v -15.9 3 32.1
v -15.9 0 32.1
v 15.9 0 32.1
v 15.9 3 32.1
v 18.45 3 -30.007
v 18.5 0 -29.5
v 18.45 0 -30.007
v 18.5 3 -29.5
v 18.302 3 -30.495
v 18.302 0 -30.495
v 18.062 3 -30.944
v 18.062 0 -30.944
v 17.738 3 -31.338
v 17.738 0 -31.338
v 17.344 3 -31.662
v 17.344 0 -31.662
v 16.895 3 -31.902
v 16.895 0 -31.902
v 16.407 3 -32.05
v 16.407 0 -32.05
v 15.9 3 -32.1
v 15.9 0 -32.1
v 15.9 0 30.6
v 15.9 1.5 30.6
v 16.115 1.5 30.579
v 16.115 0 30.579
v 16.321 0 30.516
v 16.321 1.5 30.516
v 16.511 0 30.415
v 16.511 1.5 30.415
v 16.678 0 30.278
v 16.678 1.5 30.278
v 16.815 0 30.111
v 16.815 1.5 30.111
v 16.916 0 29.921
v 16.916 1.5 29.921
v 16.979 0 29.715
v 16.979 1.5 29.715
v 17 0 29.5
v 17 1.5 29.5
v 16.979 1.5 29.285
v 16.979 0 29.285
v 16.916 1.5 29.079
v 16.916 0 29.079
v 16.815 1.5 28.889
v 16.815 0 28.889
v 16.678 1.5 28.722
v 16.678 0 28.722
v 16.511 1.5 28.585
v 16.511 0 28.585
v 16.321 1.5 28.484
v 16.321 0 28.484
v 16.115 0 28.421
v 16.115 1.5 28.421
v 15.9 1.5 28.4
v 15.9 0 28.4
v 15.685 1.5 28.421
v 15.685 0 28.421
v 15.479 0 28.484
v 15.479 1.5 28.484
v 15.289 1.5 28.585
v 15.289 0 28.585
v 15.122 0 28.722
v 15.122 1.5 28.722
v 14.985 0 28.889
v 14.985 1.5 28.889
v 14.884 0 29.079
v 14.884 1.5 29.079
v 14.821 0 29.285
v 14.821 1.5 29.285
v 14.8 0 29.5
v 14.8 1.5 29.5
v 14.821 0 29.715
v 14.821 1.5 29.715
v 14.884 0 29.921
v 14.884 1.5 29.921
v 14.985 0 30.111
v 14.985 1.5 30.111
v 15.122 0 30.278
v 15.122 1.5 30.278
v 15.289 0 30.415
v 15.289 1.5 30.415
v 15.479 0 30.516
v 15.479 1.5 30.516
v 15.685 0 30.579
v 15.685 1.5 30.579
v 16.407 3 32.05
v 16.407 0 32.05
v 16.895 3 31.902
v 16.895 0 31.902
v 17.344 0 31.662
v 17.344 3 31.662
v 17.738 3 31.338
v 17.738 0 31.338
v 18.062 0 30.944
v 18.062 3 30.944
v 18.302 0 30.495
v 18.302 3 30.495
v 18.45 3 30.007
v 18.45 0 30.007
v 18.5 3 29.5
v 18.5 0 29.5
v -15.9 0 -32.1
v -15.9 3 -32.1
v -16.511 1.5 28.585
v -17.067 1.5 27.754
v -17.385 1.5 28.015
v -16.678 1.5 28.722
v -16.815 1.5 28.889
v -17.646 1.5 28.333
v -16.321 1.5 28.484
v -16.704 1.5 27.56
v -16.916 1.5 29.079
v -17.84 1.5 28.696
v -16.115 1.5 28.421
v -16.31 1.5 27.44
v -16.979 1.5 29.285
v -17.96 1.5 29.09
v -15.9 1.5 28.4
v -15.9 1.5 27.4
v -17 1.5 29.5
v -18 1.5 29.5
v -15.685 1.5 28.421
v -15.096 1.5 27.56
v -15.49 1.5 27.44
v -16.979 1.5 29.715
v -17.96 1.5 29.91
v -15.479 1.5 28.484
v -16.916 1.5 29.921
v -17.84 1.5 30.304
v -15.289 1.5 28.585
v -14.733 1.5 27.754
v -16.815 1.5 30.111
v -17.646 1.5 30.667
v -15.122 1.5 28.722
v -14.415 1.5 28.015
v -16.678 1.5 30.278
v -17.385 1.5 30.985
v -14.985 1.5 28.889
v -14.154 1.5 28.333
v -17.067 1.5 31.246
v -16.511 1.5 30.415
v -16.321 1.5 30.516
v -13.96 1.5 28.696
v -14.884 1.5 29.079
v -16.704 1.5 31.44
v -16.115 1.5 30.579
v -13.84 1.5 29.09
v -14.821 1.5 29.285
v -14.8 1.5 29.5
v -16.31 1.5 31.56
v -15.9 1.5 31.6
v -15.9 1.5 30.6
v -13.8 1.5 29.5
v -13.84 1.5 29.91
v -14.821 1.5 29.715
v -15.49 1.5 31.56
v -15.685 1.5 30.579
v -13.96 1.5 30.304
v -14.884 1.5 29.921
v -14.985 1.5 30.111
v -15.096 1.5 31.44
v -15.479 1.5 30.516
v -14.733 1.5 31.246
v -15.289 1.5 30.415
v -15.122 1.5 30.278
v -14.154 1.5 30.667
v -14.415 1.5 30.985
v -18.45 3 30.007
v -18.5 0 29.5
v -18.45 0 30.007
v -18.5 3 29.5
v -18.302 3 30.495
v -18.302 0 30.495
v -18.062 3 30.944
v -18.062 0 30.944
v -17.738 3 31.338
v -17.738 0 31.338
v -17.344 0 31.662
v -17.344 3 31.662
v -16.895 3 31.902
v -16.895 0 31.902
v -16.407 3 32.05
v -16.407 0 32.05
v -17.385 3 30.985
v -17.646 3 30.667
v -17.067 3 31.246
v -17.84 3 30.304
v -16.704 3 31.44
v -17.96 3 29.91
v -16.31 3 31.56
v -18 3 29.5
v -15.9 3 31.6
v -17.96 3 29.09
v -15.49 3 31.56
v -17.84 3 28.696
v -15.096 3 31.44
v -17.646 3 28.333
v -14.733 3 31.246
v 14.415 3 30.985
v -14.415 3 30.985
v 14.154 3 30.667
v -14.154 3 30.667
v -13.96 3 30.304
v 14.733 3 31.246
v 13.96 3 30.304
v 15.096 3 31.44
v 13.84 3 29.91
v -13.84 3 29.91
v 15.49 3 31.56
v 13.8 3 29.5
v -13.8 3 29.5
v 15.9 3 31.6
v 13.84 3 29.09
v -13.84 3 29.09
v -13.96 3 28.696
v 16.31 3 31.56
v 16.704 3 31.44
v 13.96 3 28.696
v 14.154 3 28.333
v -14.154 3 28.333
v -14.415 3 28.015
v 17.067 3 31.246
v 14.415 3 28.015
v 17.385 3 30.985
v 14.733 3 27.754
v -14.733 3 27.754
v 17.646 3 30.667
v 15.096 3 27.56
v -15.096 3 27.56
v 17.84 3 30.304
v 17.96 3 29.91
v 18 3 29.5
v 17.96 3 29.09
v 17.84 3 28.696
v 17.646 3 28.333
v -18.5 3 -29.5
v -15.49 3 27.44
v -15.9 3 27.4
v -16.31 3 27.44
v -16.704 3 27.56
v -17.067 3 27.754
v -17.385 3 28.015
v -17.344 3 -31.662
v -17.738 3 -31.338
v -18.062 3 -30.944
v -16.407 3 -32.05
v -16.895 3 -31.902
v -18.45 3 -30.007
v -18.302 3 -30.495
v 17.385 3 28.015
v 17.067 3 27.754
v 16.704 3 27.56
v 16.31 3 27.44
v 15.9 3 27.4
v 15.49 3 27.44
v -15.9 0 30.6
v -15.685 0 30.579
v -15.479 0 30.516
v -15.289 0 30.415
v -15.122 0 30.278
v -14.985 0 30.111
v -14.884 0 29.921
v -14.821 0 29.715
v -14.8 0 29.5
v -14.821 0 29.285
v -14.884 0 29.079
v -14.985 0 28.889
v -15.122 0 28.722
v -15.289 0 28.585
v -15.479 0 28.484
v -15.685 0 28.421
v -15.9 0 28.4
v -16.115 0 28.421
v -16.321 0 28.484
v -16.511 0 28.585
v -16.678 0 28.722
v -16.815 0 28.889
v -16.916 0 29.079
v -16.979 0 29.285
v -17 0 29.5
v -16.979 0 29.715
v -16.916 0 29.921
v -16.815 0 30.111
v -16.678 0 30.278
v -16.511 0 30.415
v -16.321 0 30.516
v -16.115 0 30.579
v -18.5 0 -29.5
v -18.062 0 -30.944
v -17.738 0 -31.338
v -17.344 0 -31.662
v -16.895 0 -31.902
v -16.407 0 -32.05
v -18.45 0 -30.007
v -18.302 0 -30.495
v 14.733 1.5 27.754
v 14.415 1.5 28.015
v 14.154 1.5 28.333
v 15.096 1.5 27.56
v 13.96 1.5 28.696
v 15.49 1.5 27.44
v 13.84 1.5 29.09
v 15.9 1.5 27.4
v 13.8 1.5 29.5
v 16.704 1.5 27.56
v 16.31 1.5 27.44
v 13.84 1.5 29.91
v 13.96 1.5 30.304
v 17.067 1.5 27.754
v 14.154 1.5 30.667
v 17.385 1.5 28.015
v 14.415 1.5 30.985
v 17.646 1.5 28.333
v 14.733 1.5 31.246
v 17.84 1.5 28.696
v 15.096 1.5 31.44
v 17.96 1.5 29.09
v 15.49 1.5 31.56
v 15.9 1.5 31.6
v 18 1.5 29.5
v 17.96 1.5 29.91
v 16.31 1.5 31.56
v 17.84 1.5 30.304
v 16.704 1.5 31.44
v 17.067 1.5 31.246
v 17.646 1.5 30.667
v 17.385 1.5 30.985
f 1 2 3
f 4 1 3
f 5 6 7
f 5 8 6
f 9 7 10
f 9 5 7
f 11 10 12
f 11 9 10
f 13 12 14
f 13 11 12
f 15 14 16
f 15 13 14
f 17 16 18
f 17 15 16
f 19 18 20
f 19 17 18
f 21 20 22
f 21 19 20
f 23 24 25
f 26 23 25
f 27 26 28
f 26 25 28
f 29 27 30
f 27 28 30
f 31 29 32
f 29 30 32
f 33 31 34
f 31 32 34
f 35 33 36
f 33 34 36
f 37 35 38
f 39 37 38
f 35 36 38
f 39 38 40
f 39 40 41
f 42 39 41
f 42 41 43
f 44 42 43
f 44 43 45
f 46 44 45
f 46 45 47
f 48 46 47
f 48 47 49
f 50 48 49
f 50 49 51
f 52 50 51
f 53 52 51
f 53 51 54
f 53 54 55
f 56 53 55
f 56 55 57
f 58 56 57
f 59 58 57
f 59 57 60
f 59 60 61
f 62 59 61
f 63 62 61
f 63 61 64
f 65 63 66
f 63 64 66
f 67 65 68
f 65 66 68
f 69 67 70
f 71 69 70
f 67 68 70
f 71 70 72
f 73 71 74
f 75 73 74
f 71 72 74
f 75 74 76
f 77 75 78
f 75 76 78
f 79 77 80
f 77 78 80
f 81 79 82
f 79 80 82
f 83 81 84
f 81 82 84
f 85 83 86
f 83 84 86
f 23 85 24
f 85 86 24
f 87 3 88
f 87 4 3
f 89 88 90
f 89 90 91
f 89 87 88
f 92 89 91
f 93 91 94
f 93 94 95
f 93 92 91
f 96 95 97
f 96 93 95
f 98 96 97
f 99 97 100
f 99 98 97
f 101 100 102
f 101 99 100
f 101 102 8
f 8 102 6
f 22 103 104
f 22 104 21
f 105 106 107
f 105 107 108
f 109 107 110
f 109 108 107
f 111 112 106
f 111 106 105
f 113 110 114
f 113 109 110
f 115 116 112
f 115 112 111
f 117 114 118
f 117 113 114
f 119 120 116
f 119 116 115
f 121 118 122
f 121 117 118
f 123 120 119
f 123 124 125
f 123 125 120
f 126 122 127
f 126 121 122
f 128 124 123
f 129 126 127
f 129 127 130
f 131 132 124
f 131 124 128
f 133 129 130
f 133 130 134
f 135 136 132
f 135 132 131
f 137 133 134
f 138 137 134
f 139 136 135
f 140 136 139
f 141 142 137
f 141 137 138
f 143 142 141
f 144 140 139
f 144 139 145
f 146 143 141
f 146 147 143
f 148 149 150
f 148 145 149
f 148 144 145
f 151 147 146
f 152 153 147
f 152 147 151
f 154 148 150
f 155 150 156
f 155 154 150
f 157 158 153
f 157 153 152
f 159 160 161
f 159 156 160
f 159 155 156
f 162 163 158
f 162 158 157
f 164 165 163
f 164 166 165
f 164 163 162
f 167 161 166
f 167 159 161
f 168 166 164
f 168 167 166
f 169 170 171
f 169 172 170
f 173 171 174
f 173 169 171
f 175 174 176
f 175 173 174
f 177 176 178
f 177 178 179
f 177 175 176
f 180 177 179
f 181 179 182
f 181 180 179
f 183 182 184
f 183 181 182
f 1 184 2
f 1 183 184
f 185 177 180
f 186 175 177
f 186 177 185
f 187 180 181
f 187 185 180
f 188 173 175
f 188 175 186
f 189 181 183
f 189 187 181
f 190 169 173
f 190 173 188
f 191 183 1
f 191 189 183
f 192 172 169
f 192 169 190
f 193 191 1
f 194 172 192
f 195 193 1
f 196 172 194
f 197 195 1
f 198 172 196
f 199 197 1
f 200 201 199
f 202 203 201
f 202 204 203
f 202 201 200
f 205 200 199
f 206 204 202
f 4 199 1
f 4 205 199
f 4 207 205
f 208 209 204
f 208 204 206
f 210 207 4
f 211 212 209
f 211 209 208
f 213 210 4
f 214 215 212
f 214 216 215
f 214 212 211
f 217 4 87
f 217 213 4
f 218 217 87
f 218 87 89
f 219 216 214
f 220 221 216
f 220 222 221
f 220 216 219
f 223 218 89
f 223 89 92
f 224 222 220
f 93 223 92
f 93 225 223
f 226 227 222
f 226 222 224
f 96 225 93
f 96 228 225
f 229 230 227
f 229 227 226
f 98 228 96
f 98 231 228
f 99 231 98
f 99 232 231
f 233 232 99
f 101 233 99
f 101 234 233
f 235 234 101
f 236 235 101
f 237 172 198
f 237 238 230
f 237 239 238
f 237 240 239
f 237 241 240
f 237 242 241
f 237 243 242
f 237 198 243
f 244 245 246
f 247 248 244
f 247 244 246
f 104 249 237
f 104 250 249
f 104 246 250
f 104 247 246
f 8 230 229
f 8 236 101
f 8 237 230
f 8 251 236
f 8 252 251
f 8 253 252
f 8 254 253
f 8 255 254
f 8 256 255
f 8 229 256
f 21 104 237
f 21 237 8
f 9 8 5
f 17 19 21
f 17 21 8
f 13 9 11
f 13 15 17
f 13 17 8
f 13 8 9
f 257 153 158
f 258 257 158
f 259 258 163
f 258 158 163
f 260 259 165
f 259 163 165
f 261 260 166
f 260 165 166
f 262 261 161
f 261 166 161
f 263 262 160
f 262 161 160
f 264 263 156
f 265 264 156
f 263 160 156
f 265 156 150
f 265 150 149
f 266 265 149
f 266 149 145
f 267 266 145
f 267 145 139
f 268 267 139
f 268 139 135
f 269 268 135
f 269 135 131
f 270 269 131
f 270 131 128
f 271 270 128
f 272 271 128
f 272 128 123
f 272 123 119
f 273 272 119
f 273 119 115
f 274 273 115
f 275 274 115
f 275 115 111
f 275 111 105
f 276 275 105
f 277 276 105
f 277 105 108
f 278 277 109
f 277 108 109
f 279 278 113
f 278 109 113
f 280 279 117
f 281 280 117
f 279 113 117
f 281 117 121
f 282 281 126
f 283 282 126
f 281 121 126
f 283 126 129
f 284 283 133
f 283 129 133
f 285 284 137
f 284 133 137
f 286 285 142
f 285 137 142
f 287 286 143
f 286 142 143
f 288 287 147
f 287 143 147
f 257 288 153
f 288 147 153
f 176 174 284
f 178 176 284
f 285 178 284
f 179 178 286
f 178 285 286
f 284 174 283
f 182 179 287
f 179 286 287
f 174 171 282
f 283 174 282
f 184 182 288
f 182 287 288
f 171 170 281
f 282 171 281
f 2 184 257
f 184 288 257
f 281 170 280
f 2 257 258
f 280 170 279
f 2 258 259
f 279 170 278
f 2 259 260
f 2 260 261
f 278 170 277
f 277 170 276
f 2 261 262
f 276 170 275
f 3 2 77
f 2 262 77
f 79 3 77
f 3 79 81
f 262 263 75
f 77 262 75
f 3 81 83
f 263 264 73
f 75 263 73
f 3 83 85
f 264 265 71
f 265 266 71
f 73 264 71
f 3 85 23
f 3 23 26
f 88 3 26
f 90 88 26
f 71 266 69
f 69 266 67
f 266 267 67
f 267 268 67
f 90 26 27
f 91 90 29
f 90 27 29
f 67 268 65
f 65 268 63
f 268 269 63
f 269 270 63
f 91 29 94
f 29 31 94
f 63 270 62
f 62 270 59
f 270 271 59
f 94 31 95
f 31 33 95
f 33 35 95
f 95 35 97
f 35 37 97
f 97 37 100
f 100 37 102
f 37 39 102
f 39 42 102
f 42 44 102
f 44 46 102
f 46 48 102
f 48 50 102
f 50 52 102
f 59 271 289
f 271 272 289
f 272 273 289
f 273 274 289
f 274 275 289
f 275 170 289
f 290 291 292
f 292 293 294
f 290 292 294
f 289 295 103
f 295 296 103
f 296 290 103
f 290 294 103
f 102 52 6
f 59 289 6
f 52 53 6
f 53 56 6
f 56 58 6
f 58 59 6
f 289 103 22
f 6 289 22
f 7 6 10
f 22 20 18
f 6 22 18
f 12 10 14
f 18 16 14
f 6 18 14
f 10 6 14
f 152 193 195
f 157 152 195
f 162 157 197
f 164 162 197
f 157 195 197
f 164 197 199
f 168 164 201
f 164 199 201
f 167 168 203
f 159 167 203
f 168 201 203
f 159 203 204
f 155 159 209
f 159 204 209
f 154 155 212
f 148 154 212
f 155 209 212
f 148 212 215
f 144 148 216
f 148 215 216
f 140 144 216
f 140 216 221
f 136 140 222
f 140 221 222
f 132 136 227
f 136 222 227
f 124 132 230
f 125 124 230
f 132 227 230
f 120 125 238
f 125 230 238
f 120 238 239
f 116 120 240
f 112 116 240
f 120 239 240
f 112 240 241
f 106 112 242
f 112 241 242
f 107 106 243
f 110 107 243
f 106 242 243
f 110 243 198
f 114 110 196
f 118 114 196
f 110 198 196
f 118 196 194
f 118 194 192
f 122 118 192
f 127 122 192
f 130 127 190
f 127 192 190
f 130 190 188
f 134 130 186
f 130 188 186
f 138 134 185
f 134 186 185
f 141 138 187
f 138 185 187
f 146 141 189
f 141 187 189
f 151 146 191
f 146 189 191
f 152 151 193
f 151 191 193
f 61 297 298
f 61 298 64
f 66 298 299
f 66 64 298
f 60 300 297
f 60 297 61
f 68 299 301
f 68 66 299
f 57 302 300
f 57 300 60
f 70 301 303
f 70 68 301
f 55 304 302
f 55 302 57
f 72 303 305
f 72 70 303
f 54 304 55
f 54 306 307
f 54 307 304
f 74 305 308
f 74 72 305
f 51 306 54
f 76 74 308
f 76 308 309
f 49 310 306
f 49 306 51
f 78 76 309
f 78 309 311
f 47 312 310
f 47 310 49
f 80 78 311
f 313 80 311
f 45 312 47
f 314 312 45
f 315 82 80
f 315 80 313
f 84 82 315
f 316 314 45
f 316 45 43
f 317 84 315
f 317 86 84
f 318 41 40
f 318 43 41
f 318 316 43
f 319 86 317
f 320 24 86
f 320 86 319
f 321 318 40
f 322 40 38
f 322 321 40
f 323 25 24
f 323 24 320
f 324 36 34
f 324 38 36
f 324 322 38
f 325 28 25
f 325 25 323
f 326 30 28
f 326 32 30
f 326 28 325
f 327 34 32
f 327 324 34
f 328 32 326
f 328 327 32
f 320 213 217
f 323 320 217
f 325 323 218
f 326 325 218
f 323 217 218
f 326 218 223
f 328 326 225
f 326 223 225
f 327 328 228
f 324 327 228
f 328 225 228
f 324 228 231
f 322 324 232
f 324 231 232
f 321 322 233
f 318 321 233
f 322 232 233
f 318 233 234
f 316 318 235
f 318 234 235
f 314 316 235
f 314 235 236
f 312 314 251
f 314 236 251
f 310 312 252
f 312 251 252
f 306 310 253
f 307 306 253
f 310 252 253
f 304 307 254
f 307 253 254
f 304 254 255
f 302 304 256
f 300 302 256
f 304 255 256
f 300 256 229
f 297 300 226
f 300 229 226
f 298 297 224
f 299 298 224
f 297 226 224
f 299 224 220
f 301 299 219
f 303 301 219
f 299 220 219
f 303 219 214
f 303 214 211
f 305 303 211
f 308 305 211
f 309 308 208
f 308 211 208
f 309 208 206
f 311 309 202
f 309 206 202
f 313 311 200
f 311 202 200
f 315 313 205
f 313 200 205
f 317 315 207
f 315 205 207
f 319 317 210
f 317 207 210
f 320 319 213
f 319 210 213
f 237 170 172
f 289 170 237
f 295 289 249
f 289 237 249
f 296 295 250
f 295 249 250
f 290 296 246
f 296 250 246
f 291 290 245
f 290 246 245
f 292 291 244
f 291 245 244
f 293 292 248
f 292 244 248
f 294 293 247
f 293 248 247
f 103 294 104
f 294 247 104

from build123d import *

# Parameters (mm, degrees)
SZKIC1_W                    = 37
SZKIC1_H                    = 64.2
DODANIE_WYCI_GNI_CIE1_DEPTH = 3
ZAOKR_GLENIE1_R             = 2.6
SZKIC2_R                    = 1.1
WYTNIJ_WYCI_GNI_CIE1_DEPTH  = 38.170687376
SZKIC3_R                    = 2.1
WYTNIJ_WYCI_GNI_CIE2_DEPTH  = 1.5


with BuildPart() as part:
    # Szkic1 → Dodanie-wyciągnięcie1 (new body)
    with BuildSketch(Plane(origin=(0, 0, 0), x_dir=(1, 0, 0), z_dir=(0, 1, 0))):
        Rectangle(SZKIC1_W, SZKIC1_H)
    extrude(amount=DODANIE_WYCI_GNI_CIE1_DEPTH)

    # Zaokrąglenie1
    zaokr_glenie1_edges = [part.edges().sort_by_distance(p)[0] for p in [
        (18.5, 1.5, 32.1),
        (-18.5, 1.5, 32.1),
        (-18.5, 1.5, -32.1),
        (18.5, 1.5, -32.1),
    ]]
    fillet(zaokr_glenie1_edges, radius=ZAOKR_GLENIE1_R)

    # Szkic2 → Wytnij-wyciągnięcie1 (cut, through all)
    with BuildSketch(Plane(origin=(0, 3, 0), x_dir=(1, 0, 0), z_dir=(0, 1, 0))):
        with Locations(Location((15.9, -29.5, 0), (0, 0, 270))):
            Circle(SZKIC2_R)
        with Locations(Location((-15.9, -29.5, 0), (0, 0, 270))):
            Circle(SZKIC2_R)
    extrude(amount=-WYTNIJ_WYCI_GNI_CIE1_DEPTH, mode=Mode.SUBTRACT)

    # Szkic3 → Wytnij-wyciągnięcie2 (cut)
    with BuildSketch(Plane(origin=(0, 3, 0), x_dir=(1, 0, 0), z_dir=(0, 1, 0))):
        with Locations(Location((-15.9, -29.5, 0), (0, 0, 270))):
            Circle(SZKIC3_R)
        with Locations(Location((15.9, -29.5, 0), (0, 0, 270))):
            Circle(SZKIC3_R)
    extrude(amount=-WYTNIJ_WYCI_GNI_CIE2_DEPTH, mode=Mode.SUBTRACT)


solid = part.part
